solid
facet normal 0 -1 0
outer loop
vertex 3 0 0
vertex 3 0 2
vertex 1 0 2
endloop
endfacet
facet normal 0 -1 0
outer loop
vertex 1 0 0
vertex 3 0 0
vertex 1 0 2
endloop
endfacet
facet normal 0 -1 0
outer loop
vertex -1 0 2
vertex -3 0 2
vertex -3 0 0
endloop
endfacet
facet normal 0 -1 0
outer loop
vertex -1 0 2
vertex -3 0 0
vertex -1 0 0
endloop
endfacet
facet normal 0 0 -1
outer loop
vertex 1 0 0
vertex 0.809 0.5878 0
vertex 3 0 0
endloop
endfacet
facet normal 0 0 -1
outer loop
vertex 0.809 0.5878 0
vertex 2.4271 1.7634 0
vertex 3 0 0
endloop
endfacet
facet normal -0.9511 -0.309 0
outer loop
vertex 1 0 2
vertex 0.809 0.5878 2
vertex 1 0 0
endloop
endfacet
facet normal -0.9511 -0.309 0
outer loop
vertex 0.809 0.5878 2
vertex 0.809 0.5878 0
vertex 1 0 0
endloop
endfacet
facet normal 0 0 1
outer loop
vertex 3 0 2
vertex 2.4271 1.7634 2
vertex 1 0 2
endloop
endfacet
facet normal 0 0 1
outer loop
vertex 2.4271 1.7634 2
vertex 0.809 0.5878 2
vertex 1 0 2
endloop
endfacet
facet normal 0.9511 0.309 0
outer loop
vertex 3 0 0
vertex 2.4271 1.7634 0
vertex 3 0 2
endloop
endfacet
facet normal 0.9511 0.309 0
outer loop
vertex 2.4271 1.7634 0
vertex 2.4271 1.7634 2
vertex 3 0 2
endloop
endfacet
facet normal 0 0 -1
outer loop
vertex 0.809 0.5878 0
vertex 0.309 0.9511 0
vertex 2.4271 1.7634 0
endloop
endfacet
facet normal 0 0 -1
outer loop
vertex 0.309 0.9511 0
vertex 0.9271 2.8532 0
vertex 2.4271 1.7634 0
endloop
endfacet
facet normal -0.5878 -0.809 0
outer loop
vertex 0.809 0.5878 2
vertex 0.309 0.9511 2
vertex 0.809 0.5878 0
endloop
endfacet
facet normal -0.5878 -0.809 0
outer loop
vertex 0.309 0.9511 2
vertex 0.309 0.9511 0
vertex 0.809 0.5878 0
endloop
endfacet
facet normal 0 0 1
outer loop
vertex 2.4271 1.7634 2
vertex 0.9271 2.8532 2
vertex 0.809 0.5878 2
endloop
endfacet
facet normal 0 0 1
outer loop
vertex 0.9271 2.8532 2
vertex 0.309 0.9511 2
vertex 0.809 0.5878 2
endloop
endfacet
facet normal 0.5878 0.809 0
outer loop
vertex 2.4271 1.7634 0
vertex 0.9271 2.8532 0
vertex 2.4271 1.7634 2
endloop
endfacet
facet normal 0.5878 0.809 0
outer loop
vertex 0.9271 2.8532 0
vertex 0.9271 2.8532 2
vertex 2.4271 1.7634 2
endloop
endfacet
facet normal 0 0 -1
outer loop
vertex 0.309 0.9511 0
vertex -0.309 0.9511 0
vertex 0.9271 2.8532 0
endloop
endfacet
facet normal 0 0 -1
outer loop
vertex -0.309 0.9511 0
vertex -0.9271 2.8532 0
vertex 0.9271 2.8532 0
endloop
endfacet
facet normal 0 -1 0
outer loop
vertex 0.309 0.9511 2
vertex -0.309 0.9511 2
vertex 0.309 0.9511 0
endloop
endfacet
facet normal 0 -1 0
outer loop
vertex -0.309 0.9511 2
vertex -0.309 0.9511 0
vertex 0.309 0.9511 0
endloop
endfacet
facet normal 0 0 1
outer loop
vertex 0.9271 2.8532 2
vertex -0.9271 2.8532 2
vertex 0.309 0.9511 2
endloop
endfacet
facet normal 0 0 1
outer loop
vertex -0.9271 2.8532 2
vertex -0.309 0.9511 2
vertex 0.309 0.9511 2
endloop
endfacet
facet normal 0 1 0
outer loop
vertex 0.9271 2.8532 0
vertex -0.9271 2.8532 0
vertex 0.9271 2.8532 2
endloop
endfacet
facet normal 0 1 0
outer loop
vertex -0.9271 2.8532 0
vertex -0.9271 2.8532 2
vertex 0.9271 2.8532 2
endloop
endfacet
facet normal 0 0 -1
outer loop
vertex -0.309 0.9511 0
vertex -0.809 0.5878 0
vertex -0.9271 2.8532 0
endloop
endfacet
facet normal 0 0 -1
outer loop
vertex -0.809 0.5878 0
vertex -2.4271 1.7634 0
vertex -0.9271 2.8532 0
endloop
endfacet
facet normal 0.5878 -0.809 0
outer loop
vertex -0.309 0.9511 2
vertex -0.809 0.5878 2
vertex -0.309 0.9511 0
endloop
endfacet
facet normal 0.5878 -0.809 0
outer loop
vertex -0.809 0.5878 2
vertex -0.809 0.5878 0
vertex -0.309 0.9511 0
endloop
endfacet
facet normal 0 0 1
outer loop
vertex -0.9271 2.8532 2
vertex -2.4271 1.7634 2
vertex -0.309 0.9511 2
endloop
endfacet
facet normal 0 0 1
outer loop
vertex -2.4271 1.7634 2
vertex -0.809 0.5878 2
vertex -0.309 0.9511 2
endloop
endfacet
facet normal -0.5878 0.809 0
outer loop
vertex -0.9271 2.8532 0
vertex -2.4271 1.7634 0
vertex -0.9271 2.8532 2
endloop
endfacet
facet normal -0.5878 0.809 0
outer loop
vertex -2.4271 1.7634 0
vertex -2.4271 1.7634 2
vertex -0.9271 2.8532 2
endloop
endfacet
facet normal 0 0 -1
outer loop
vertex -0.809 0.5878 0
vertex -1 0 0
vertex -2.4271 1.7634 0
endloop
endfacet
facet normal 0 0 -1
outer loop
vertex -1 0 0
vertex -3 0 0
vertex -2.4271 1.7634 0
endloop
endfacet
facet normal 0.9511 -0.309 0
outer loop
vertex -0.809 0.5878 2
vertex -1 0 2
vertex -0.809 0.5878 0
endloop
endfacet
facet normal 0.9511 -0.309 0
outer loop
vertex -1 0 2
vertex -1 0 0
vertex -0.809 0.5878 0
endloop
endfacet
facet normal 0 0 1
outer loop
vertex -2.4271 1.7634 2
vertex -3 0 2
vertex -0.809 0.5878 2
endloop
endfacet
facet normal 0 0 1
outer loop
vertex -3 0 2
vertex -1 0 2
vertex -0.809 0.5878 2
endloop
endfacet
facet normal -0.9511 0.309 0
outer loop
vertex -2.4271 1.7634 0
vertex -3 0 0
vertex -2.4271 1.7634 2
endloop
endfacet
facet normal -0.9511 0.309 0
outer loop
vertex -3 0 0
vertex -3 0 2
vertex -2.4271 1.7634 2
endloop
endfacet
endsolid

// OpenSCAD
// Generated by scadwright. Do not hand-edit —
// edit the Python source and regenerate.

rotate_extrude(angle=180) {
    polygon(points=[[1, 0], [3, 0], [3, 2], [1, 2]]);
}
